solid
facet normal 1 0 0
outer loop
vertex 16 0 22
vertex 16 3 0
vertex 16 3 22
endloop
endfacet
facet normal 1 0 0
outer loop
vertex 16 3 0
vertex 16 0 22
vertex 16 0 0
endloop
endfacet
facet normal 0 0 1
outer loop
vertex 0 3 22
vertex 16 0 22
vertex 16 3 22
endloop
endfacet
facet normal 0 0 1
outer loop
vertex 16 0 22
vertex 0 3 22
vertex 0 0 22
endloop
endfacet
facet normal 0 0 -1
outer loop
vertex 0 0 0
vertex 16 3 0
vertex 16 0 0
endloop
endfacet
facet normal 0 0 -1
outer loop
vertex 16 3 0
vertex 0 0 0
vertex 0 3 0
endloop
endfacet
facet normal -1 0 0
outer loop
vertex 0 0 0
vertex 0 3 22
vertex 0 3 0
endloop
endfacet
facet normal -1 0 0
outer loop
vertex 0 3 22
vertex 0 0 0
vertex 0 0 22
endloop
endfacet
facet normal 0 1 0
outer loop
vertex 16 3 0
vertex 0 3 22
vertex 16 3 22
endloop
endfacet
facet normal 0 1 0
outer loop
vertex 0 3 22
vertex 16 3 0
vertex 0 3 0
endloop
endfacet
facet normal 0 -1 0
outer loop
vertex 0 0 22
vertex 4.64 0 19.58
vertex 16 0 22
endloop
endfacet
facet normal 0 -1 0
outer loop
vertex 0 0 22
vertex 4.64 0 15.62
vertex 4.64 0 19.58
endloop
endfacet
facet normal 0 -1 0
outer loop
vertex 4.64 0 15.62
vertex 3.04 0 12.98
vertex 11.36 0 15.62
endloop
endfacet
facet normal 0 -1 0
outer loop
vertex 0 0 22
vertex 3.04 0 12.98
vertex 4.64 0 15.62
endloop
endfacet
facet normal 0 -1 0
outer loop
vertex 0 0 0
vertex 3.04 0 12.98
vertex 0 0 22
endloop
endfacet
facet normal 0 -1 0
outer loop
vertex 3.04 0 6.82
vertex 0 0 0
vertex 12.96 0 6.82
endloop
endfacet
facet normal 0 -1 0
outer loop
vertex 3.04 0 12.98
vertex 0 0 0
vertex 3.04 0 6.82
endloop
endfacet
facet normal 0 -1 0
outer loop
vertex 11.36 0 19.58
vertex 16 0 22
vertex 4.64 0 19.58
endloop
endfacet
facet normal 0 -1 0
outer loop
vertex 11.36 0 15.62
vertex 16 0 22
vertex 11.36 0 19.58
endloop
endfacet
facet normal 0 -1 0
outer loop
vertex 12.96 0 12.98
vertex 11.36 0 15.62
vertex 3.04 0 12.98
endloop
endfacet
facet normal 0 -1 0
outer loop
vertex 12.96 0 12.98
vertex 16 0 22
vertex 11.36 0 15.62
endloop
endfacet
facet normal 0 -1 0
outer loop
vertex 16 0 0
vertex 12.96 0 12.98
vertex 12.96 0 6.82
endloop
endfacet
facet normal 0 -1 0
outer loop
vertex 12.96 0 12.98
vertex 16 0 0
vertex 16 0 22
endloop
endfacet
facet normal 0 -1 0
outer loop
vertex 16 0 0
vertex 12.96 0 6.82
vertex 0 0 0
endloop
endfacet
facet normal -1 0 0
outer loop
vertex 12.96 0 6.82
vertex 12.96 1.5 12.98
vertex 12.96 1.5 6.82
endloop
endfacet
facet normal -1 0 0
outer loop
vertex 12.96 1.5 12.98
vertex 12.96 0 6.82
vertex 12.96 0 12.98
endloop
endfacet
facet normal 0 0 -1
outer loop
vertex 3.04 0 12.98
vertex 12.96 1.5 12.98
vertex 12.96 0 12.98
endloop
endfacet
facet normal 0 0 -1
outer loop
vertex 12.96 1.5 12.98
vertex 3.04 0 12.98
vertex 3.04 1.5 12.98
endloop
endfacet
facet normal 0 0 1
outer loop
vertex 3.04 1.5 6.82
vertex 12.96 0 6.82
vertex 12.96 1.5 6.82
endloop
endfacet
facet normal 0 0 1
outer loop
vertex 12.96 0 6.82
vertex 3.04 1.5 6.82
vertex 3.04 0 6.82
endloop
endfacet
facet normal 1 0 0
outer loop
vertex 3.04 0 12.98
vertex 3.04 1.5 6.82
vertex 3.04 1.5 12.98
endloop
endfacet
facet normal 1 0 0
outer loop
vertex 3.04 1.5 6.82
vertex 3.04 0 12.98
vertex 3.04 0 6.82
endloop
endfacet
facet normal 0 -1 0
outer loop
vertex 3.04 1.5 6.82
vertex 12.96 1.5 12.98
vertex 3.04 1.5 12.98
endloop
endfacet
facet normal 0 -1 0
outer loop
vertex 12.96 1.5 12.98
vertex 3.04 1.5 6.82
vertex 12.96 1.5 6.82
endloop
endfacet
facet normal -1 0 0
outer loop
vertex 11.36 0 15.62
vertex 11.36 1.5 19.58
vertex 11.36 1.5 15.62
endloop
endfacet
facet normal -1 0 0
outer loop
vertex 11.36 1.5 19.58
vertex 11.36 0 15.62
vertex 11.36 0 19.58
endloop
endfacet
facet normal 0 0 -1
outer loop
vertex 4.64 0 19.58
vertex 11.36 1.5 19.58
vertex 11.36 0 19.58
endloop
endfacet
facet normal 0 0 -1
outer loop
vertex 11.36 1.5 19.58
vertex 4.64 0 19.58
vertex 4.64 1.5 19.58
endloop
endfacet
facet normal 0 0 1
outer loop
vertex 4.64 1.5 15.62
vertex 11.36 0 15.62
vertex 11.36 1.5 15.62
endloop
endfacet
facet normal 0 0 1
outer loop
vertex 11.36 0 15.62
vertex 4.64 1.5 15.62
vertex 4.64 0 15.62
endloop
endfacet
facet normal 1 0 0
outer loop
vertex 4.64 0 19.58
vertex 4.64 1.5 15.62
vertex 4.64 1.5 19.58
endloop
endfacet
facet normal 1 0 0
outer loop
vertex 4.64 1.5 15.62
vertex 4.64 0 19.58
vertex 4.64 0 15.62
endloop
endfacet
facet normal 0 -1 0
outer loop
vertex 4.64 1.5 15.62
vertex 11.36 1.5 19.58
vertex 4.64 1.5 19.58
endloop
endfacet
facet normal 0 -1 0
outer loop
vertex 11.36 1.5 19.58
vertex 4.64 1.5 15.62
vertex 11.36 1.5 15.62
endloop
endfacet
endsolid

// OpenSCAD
// DIN-rail retaining clip.
$fn = 60;
eps = 0.02;
clip_w = 16;
clip_h = 22;
clip_t = 3;
difference() { cube([clip_w,clip_t,clip_h]); translate([clip_w/2, -eps, clip_h*0.45]) cube([clip_w*0.62,clip_t+2*eps,clip_h*0.28],center=true); translate([clip_w/2, -eps, clip_h*0.8]) cube([clip_w*0.42,clip_t+2*eps,clip_h*0.18],center=true); }
